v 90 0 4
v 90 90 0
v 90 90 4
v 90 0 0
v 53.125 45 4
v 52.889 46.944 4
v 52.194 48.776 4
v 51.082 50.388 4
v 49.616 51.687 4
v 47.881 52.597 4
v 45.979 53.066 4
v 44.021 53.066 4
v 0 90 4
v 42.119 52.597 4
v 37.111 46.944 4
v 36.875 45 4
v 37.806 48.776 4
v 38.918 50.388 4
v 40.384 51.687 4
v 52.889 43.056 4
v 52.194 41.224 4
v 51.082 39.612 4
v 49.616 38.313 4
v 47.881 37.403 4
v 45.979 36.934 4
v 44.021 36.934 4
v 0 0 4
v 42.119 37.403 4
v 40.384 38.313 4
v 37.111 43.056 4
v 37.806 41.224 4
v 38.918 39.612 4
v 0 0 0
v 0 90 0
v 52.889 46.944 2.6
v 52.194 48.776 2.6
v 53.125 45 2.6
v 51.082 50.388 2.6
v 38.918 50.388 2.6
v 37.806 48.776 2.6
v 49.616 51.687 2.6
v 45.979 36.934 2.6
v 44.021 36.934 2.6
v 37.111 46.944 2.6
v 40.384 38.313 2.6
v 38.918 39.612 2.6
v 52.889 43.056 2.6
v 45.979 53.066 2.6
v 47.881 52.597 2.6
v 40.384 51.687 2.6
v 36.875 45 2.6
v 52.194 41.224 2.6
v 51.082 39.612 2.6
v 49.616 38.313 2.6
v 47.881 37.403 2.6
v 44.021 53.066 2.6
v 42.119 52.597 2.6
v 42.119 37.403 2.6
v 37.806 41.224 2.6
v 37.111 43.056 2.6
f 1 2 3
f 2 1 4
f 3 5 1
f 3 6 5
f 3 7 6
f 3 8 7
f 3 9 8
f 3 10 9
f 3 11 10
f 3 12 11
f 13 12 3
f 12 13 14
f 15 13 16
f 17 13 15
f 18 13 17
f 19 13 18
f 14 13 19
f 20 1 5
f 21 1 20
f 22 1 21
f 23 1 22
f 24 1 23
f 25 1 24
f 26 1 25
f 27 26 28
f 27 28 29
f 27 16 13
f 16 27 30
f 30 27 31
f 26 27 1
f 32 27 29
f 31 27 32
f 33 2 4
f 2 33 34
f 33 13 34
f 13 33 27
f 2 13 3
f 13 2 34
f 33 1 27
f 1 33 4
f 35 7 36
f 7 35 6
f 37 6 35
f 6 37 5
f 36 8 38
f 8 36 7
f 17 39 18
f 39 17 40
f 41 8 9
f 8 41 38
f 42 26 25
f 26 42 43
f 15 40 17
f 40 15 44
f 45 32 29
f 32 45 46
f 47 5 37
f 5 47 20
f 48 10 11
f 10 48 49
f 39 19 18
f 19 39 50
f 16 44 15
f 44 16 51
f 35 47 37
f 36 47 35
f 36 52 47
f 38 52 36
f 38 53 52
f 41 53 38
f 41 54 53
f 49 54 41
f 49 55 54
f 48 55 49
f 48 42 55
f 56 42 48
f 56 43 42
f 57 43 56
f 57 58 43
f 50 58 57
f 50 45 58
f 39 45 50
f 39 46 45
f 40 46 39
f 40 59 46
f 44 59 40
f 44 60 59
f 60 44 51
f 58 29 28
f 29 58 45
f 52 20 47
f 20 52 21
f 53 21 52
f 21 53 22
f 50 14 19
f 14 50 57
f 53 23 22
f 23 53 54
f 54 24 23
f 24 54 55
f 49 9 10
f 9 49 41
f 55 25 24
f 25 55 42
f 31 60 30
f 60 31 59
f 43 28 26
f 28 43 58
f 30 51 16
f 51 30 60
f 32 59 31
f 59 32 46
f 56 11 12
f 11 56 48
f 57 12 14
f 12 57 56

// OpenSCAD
length = 90;
width = 90;
height = 4;

//Based on washer size:
washerDiameter = 16.25;
washerHeight = 1.4;

difference() {
cube([length, width, height]);
    translate([length/2, width/2, height - washerHeight])
        cylinder(washerHeight, d=washerDiameter);
}
//widthSections = widthDividers + 1;
//lengthSections = lengthDividers + 1;
//difference() {
//    union() {
//        
//        for(index=[0:widthDividers])
//            translate([0, (width/widthSections) * index - (wallThickness/2), 0])
//                cube([length, wallThickness, height]);
//        for(index=[0:lengthDividers])
//            translate([ (length/lengthSections) * index - (wallThickness/2), 0, 0])
//                cube([wallThickness, width, height]);
//        
//        translate([length/2, width/2, 0])
//            cylinder(height, d=magnetBaseOuterDiameter);
//    };
//    
//};
